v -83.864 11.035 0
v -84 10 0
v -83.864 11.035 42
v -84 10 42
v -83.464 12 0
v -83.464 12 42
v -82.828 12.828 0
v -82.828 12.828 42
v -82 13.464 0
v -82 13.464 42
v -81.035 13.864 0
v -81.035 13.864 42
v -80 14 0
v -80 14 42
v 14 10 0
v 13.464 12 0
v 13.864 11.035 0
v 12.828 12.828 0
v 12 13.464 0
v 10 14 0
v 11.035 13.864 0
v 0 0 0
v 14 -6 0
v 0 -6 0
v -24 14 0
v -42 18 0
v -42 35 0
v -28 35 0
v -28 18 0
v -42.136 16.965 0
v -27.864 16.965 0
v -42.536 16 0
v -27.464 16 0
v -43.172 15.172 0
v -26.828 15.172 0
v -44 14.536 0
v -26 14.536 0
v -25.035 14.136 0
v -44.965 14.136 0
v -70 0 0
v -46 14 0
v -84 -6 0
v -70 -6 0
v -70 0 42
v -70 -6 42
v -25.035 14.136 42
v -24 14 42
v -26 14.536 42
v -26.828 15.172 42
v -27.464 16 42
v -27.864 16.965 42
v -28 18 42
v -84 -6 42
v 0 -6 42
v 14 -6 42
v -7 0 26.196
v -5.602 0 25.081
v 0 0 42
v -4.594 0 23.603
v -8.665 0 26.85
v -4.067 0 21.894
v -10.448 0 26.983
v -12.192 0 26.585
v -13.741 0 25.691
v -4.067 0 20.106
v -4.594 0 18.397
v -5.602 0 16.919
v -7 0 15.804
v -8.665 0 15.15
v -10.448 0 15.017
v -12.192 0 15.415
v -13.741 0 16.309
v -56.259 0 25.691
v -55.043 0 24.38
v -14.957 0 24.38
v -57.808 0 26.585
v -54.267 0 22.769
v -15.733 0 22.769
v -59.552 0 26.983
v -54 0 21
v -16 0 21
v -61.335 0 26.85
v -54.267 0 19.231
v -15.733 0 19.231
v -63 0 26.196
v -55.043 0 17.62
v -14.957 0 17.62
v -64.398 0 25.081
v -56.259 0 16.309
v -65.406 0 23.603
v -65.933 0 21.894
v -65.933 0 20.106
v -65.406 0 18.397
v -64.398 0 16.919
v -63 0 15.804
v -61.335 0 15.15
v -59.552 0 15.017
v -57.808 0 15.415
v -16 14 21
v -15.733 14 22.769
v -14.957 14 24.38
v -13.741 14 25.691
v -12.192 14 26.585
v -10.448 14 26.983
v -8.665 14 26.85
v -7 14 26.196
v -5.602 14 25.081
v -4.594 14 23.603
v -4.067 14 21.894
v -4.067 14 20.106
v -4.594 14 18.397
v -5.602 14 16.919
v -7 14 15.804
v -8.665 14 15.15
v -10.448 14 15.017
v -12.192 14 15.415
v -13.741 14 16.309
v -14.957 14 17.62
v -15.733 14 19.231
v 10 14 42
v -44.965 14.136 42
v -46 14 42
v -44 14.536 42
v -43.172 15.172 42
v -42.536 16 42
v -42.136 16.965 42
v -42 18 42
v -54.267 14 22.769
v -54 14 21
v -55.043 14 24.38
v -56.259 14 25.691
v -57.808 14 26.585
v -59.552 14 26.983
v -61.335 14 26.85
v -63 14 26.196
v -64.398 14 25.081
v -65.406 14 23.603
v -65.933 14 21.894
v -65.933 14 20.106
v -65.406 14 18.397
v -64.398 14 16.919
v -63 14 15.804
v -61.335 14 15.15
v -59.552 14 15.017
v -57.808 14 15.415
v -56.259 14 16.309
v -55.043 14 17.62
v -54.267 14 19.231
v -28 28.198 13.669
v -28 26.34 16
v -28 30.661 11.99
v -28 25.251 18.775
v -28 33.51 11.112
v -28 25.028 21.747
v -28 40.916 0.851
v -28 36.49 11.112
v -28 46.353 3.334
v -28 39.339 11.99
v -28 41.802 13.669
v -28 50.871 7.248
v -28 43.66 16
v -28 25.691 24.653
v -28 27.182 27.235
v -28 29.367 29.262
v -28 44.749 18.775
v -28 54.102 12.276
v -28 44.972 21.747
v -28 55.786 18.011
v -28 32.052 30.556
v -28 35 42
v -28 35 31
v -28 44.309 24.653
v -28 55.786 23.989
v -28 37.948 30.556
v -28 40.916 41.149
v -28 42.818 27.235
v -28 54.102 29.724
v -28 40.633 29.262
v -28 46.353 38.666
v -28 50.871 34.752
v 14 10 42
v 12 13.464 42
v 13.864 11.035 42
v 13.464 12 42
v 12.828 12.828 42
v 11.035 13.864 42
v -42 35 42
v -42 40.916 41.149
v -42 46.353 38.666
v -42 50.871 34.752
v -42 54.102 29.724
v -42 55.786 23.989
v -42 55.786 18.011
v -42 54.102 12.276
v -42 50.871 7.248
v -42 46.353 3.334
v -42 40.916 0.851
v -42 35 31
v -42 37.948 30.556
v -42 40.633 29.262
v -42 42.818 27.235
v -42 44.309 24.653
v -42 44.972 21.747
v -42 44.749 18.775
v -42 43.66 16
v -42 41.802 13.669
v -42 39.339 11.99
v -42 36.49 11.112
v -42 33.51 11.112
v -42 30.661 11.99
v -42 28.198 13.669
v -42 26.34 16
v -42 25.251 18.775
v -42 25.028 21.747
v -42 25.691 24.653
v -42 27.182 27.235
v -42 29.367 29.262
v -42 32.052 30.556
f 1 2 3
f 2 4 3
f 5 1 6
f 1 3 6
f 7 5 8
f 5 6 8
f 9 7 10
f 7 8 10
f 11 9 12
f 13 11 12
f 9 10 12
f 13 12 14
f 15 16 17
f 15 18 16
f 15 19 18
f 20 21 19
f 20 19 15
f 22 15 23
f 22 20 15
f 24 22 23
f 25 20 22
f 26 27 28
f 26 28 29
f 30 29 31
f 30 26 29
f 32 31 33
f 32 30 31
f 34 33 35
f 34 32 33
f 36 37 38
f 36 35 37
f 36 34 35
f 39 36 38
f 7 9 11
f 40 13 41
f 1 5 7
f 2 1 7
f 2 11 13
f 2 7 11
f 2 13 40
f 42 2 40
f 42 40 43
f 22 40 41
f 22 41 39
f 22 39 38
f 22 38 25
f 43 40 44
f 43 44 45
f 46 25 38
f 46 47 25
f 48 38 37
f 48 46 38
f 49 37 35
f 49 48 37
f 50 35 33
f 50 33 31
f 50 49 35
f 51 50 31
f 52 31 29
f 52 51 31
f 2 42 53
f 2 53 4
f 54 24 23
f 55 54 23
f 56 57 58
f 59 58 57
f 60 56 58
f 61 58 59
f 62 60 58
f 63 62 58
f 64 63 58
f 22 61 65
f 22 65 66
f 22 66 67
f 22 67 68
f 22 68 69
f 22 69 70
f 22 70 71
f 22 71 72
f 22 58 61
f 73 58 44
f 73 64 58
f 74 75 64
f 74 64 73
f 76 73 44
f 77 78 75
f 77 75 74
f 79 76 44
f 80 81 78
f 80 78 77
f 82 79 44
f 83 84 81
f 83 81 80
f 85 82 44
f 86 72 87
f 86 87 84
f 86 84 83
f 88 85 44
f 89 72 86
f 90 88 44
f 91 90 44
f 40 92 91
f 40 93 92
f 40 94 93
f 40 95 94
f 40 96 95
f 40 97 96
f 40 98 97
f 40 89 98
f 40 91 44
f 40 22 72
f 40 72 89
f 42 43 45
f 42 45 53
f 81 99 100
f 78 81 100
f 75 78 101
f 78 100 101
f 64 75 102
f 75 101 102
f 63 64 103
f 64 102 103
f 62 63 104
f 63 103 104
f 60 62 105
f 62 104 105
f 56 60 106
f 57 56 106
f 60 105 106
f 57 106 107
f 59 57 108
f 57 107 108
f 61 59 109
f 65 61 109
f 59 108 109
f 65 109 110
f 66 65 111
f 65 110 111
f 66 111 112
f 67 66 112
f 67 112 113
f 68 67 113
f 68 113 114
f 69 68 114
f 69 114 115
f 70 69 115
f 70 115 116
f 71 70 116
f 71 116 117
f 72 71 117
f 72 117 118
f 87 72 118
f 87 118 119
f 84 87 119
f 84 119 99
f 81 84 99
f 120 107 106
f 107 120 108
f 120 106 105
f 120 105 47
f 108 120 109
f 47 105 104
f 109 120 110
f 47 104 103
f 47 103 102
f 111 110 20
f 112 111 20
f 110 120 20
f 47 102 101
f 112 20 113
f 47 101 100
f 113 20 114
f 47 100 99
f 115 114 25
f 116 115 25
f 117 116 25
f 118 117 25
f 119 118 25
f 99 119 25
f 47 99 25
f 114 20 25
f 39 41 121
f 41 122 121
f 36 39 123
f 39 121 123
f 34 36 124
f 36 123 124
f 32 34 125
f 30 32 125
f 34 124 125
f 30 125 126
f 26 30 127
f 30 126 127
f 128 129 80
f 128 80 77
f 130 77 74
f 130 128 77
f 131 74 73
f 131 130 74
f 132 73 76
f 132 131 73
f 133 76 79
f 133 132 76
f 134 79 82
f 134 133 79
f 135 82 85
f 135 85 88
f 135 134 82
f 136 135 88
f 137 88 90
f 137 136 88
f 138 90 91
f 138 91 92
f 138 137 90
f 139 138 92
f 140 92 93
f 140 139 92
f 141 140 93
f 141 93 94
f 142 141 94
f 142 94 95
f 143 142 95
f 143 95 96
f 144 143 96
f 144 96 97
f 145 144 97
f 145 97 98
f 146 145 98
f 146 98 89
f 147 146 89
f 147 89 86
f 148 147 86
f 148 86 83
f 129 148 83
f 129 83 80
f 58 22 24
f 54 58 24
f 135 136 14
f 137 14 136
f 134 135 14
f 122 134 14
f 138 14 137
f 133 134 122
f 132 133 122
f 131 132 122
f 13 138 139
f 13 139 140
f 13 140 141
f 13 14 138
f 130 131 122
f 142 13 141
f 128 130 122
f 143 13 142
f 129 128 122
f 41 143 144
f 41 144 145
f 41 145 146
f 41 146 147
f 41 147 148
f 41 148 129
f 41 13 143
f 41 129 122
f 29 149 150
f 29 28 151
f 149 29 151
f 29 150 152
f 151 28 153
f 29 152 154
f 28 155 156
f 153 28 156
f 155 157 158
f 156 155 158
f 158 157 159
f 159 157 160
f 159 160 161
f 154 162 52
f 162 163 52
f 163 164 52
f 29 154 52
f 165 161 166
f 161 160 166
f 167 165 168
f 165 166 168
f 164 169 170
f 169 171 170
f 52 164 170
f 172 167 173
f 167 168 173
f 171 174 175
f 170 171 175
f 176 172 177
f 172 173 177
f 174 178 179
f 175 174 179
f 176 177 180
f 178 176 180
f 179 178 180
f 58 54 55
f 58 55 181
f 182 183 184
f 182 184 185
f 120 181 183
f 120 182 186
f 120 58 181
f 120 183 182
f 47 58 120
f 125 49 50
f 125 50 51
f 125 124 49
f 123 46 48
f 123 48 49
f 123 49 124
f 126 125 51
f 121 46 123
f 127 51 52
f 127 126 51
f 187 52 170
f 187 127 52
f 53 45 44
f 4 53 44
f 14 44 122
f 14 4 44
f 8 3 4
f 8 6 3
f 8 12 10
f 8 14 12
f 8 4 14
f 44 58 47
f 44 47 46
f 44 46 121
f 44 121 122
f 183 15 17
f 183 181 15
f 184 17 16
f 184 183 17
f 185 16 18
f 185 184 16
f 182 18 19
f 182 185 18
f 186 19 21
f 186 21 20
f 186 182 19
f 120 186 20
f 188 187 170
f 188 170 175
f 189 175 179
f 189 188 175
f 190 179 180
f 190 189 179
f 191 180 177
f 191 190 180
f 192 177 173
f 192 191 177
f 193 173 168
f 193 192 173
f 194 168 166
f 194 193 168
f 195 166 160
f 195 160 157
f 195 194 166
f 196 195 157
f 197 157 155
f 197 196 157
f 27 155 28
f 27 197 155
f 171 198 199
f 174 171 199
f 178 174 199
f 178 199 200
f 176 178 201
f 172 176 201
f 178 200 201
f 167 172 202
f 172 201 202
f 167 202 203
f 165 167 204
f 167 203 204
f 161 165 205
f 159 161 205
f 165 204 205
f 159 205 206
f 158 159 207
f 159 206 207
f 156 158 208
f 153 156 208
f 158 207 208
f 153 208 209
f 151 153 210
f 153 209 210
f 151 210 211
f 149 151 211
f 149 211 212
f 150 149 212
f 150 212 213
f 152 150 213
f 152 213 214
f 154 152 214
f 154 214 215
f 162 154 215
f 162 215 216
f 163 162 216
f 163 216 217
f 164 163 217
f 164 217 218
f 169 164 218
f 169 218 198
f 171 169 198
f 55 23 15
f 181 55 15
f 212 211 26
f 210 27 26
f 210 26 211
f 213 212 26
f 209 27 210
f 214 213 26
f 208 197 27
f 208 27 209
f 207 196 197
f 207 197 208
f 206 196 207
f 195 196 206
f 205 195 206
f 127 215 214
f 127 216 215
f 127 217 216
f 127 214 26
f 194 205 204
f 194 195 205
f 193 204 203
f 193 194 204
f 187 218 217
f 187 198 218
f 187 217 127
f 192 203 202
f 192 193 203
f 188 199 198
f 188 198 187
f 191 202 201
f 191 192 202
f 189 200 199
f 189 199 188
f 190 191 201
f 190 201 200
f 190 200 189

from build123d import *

# Parameters (mm, degrees)
BOSS_EXTRUDE1_DEPTH = 42
SKETCH3_R           = 10
BOSS_EXTRUDE2_DEPTH = 7
SKETCH4_R           = 6
CUT_EXTRUDE1_DEPTH  = 69.942004613
FILLET1_R           = 4


with BuildPart() as part:
    # Sketch1 → Boss-Extrude1 (new body)
    with BuildSketch(Plane.XY):
        Polygon((0, 0), (0, -6), (14, -6), (14, 14), (-35, 14), (-35, 0), align=None)
    extrude(amount=BOSS_EXTRUDE1_DEPTH)

    # Sketch3 → Boss-Extrude2 (add)
    with BuildSketch(Plane.ZY.offset(28)):
        with BuildLine():
            Line((0, 14), (42, 14))
            Line((42, 14), (42, 35))
            ThreePointArc((42, 35), (21, 56), (0, 35))
            Line((0, 35), (0, 14))
        make_face()
        with Locations((21, 35)):
            Circle(SKETCH3_R, mode=Mode.SUBTRACT)
    extrude(amount=BOSS_EXTRUDE2_DEPTH)

    # Sketch4 → Cut-Extrude1 (cut, through all)
    with BuildSketch(Plane(origin=(0, 14, 0), x_dir=(1, 0, 0), z_dir=(0, 1, 0))):
        with Locations(Location((-10, -21, 0), (0, 0, 180))):
            Circle(SKETCH4_R)
    extrude(amount=-CUT_EXTRUDE1_DEPTH, mode=Mode.SUBTRACT)

    # Fillet1
    fillet1_edges = [part.edges().sort_by_distance(p)[0] for p in [
        (14, 14, 21),
        (-28, 14, 21),
    ]]
    fillet(fillet1_edges, radius=FILLET1_R)

    # Mirror2: part across plane


with BuildPart() as part_1:
    add(part.part)
    add(part.part.mirror(Plane(origin=(-35, 14, 42), x_dir=(0, 0, 1), z_dir=(1, 0, 0))))


solid = part_1.part
